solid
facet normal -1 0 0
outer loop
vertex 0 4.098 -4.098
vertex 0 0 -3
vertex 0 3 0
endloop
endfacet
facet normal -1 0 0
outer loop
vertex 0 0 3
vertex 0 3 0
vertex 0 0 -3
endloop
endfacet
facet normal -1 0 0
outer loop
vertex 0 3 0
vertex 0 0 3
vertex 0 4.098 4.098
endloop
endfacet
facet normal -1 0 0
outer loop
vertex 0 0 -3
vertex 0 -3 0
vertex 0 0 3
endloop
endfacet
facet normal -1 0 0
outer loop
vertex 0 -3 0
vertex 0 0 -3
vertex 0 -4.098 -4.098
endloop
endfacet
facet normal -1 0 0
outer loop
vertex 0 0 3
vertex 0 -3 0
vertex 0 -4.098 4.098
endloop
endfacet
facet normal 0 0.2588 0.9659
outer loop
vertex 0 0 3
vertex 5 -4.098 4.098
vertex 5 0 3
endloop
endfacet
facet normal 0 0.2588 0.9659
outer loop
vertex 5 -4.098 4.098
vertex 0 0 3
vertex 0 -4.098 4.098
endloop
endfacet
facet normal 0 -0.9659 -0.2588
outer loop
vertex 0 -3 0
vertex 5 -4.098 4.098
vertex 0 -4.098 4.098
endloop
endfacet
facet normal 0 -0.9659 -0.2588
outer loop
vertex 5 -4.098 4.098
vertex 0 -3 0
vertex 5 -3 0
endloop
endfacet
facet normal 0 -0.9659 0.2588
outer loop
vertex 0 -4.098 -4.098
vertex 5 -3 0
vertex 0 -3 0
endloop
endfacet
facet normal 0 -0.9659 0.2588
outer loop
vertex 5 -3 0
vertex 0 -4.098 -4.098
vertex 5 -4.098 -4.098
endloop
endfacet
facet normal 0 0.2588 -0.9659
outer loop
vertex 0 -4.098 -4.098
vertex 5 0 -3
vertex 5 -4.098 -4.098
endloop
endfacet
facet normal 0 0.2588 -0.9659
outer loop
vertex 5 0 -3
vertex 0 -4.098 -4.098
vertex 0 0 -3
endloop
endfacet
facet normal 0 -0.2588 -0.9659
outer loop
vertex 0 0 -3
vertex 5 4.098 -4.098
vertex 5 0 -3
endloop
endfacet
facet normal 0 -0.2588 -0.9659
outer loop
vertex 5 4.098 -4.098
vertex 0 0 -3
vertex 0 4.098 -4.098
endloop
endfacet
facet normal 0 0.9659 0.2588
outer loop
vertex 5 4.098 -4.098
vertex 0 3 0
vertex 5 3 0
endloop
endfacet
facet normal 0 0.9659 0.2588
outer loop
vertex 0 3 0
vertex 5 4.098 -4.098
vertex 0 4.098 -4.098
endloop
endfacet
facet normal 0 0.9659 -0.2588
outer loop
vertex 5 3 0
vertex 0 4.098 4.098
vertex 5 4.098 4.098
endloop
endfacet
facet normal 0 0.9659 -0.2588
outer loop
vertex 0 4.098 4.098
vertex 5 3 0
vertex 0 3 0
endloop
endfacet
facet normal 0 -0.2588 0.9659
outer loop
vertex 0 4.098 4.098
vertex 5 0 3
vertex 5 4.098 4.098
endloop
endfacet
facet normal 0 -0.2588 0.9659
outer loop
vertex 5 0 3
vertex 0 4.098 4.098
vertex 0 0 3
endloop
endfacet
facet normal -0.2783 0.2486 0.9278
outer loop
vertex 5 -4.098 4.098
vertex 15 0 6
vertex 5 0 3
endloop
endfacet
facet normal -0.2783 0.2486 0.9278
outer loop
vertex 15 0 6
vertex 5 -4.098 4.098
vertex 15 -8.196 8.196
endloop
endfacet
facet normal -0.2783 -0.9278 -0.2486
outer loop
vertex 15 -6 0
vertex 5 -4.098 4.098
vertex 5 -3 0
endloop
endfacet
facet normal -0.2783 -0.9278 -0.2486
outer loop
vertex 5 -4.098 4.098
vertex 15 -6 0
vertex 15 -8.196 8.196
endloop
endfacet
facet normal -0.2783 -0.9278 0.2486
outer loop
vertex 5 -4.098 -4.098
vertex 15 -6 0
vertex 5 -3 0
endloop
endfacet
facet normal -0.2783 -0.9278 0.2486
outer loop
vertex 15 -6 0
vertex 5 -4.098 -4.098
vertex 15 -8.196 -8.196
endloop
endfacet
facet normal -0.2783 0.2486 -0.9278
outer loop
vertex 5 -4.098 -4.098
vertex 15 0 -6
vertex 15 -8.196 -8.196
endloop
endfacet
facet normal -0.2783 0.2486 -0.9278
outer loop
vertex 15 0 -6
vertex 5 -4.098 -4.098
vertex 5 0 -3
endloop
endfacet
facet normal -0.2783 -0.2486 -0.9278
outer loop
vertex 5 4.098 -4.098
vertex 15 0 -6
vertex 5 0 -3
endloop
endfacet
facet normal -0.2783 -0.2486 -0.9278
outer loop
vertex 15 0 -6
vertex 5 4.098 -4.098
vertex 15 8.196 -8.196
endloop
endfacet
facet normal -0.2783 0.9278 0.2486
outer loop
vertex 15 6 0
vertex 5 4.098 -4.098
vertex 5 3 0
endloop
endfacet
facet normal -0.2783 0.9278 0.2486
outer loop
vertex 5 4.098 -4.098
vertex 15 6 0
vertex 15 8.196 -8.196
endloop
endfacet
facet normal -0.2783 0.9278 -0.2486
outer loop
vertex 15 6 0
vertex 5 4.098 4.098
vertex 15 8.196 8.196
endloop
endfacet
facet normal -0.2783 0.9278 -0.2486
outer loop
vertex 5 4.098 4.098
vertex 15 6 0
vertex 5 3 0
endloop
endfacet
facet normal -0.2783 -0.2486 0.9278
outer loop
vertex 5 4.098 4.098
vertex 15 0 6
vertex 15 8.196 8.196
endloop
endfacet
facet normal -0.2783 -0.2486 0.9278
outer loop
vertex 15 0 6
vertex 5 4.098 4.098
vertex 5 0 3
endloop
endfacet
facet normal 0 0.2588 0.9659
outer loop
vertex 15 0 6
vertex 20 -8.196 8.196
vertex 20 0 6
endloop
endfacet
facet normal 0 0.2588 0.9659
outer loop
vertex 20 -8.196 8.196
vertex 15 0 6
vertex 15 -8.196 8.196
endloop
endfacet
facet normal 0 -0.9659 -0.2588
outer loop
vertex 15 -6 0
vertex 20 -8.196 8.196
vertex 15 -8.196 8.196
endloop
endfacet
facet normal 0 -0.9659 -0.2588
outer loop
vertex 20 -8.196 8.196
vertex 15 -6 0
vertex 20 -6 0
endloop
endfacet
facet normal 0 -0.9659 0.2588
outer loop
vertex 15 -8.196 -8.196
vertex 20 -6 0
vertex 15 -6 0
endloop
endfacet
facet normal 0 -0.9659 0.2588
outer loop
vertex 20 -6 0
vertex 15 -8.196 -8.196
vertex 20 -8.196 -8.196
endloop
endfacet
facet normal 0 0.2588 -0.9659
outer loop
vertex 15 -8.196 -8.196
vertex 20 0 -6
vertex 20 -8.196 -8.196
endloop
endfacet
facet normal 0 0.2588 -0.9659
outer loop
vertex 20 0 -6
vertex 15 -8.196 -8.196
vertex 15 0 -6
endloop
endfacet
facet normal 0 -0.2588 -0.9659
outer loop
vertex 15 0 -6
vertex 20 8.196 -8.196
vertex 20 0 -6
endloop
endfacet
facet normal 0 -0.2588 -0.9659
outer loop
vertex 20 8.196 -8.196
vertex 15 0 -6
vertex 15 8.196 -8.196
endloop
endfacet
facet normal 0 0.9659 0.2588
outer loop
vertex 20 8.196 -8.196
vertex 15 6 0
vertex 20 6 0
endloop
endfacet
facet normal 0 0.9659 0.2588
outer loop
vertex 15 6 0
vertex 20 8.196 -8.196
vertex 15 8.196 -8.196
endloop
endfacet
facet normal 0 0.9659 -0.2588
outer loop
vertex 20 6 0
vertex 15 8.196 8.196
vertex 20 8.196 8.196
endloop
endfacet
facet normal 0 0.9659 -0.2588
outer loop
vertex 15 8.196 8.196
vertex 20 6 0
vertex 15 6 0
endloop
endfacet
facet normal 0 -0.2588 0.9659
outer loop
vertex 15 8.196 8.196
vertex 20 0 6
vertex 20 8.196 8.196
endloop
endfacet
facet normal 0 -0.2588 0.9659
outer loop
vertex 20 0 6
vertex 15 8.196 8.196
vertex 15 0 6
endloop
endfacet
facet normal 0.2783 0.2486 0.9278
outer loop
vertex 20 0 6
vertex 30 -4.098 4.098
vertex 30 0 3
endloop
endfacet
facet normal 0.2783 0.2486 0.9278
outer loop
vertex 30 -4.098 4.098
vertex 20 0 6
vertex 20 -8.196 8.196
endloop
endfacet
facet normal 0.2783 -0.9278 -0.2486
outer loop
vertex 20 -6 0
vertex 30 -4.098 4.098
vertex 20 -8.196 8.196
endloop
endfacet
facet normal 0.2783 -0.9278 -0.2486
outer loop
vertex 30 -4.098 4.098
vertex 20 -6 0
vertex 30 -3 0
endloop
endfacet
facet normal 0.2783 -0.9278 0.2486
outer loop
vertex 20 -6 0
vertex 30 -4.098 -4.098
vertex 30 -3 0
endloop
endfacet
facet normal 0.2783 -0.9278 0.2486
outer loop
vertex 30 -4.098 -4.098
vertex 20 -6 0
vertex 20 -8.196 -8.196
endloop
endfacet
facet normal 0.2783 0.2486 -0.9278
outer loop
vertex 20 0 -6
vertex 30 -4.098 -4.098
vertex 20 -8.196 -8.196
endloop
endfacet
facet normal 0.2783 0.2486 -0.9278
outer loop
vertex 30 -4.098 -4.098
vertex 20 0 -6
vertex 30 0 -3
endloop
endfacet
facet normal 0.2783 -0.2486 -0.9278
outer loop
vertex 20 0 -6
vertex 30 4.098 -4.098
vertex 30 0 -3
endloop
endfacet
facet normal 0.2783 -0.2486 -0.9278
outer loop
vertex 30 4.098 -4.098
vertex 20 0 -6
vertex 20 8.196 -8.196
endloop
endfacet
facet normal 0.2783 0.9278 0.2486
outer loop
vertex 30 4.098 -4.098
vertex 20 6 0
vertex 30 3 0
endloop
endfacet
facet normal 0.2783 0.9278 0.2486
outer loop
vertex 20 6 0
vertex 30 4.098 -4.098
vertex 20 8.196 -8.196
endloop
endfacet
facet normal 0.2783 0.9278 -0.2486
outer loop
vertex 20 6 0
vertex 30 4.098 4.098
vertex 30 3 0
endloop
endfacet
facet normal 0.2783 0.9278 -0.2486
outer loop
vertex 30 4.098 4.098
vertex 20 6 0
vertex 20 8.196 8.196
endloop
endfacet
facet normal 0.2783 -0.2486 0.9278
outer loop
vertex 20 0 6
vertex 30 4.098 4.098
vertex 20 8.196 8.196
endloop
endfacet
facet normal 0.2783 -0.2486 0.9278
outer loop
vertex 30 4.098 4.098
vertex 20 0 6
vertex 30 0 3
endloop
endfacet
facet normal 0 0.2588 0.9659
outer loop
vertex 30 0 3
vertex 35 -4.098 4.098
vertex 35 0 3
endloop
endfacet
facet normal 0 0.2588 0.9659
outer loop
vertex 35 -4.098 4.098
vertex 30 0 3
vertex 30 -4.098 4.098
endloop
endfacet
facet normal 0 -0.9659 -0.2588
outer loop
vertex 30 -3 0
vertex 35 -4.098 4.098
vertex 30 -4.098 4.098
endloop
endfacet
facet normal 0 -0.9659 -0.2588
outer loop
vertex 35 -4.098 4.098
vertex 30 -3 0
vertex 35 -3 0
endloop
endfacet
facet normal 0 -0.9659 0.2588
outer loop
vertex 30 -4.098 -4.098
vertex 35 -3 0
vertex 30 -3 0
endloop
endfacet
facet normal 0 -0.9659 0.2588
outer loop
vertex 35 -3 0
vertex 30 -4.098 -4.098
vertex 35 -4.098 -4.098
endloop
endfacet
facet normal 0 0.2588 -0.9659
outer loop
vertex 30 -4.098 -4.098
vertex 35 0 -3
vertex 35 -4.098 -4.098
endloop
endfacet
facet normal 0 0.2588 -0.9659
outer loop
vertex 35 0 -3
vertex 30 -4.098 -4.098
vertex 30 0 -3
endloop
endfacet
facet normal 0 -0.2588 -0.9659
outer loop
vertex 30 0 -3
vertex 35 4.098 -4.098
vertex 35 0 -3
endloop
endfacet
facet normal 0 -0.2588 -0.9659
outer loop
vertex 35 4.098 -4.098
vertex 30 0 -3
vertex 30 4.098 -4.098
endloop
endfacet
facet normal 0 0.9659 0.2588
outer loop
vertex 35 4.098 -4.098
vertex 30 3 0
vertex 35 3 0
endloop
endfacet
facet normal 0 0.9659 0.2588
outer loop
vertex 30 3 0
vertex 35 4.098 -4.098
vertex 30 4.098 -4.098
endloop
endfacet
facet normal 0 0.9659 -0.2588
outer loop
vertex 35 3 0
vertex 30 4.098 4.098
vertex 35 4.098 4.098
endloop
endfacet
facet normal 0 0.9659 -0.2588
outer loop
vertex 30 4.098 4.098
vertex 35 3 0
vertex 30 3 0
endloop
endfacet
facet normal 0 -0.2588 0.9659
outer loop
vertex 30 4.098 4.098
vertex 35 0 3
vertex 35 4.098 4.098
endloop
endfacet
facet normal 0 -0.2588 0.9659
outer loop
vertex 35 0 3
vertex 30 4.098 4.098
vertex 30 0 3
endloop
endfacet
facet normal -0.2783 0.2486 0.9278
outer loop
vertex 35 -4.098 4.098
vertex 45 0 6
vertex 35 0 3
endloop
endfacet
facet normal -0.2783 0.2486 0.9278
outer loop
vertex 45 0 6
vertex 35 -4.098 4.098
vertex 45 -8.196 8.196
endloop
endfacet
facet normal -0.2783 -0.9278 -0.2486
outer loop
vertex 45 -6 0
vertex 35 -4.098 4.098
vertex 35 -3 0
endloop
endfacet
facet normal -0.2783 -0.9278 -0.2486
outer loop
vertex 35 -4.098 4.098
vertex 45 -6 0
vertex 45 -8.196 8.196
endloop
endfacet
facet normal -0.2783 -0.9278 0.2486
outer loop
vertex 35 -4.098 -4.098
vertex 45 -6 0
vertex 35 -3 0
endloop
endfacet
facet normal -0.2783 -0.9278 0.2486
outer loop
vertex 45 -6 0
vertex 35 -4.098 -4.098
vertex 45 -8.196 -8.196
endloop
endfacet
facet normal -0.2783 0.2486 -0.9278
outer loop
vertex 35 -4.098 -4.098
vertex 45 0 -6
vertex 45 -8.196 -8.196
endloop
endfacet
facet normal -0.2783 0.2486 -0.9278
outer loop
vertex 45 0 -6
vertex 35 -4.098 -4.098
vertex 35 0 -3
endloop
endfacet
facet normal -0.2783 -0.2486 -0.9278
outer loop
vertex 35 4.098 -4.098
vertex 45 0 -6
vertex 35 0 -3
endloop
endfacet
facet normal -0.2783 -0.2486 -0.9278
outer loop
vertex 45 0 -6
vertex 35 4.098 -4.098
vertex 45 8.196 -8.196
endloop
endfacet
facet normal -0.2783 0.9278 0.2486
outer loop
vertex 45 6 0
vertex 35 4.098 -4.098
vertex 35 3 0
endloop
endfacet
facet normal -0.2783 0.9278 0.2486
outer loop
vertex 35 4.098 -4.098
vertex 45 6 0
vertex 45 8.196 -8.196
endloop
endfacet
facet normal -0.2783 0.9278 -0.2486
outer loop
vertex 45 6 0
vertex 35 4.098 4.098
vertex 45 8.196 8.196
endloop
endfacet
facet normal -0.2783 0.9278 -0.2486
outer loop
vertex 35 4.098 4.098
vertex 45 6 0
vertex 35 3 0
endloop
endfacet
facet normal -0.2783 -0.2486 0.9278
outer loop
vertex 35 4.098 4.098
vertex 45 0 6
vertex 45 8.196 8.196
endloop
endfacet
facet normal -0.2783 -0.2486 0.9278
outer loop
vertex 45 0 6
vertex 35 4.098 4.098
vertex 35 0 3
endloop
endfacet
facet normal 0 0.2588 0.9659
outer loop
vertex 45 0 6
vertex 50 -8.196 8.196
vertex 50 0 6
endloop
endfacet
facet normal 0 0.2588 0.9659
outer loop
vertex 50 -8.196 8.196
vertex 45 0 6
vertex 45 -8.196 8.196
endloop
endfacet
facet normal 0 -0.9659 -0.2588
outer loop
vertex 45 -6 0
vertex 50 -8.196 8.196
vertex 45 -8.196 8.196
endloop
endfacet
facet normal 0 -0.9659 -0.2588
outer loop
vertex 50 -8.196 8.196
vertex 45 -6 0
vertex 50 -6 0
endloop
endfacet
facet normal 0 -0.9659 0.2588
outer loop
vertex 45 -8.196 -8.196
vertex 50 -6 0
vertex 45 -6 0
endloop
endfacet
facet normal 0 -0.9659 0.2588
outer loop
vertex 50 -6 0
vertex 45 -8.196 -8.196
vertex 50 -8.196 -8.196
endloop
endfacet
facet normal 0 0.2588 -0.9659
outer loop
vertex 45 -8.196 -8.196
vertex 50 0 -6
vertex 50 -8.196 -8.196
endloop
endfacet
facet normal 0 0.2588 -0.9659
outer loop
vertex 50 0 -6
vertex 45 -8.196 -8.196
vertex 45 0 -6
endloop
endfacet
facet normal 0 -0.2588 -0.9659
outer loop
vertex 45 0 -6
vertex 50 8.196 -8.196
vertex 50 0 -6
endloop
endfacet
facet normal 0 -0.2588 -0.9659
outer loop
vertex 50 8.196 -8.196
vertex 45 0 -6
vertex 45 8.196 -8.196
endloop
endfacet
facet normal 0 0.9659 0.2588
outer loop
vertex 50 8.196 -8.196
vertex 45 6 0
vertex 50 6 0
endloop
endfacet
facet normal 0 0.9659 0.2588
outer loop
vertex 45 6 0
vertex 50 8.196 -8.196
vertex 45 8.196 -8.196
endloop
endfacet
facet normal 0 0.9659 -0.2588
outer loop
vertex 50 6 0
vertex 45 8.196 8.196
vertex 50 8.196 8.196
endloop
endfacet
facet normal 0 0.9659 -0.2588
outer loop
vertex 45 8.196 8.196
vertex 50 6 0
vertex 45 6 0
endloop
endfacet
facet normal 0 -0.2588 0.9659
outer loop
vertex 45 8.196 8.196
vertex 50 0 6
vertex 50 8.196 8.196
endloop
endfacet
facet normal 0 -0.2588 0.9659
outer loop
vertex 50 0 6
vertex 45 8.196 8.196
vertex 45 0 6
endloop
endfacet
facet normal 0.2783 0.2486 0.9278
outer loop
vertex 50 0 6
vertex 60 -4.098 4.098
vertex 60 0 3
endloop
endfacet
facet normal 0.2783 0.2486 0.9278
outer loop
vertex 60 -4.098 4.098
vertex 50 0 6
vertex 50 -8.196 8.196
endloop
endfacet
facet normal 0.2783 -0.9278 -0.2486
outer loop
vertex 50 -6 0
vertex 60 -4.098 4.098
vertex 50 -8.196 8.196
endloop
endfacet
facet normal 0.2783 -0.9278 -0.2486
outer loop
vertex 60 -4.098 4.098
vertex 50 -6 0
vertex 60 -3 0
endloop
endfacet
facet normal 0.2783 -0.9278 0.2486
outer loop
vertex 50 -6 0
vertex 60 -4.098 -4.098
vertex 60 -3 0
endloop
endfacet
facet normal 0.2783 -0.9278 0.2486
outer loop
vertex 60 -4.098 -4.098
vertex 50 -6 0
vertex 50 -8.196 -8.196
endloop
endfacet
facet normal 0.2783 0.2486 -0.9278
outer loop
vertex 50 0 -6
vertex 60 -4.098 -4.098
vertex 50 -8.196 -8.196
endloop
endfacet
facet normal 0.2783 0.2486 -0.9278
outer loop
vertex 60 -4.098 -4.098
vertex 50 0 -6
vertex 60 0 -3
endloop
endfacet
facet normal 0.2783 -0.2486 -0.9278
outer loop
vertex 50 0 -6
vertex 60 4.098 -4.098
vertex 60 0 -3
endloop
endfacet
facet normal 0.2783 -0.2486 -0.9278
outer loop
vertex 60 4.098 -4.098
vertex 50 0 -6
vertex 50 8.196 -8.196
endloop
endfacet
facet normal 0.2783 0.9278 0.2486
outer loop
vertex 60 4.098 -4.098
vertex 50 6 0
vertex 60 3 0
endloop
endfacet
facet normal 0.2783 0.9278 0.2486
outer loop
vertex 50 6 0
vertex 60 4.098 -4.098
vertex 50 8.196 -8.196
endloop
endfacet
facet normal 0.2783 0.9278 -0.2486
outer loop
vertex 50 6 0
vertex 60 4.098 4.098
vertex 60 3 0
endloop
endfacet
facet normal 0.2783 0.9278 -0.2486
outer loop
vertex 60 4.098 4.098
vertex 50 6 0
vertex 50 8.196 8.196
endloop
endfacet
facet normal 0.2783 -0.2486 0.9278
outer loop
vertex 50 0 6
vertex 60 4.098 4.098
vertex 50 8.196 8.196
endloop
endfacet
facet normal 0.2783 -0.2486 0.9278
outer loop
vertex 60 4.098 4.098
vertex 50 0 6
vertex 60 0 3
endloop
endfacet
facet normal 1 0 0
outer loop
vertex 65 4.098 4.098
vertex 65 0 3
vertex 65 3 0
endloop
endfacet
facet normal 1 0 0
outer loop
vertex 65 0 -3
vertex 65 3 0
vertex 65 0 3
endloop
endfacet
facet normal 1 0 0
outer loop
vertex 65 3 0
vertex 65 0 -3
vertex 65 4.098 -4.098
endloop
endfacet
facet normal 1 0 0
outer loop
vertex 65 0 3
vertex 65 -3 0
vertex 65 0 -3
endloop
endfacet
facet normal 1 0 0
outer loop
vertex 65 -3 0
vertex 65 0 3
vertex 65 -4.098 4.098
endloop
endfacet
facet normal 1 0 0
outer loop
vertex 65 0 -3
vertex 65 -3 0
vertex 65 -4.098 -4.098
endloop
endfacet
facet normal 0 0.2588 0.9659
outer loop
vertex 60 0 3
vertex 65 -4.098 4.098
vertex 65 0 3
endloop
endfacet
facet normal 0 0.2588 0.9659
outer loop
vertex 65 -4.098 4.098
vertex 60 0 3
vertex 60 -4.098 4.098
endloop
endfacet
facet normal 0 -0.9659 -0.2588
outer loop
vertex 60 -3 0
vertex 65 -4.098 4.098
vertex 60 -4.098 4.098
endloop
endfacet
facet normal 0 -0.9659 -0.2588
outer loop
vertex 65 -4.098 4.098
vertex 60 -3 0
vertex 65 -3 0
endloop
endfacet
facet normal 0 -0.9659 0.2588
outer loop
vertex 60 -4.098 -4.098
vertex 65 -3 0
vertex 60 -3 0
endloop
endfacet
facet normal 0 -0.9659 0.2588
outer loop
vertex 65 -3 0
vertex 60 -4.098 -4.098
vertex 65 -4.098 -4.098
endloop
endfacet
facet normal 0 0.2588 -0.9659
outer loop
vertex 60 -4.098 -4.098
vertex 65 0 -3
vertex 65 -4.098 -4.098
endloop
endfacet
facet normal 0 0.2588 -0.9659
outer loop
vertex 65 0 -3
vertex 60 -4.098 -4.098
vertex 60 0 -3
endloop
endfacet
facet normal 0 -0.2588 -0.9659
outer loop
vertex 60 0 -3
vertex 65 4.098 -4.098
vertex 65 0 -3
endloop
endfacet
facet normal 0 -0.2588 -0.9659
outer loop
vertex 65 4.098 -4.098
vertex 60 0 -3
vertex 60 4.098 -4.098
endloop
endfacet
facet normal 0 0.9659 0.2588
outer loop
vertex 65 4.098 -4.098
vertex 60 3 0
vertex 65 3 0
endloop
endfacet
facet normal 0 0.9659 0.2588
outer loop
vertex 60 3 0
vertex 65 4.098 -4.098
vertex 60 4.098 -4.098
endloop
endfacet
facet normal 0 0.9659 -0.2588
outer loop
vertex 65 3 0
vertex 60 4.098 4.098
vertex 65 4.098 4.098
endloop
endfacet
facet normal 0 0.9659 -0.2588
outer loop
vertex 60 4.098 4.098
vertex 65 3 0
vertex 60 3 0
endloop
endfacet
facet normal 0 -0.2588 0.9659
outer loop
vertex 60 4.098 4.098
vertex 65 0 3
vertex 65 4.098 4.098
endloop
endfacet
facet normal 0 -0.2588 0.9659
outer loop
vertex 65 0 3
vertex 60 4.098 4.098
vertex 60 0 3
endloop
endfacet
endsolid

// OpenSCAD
//-*- C -*-
// points = number of points (minimum 3)
// outer = radius to outer points
// inner = radius to inner points
module Star(points, outer, inner) {
	// polar to cartesian: radius/angle to x/y
	function x(r, a) = r * cos(a);
	function y(r, a) = r * sin(a);
	// angular width of each pie slice of the star
	increment = 360/points;
	union() {
		for (p = [0 : points-1]) {
			// outer is outer point p
			// inner is inner point following p
			// next is next outer point following p
			x_outer = x(outer, increment * p);
			y_outer = y(outer, increment * p);
			x_inner = x(inner, (increment * p) + (increment/2));
			y_inner = y(inner, (increment * p) + (increment/2));
			x_next = x(outer, increment * (p+1));
			y_next = y(outer, increment * (p+1));

			polygon(points = [[x_outer, y_outer],
			                  [x_inner, y_inner],
			                  [x_next, y_next],
			                  [0, 0]],
			         paths = [[0, 1, 2, 3]]);
		}
	}
}

module linxtrude(xx, hheight, sscale) {
	translate([xx,0,0]) rotate([0,90,0])
		linear_extrude(height = hheight, center=false, convexity=10,
		               twist=0, slices=1, scale = sscale)
			children();
}

cornAng = 60;
nCorn = 4;
contractRatio = 2;
contractRatioB = 2;
Rpore = 6;
Rtrot = Rpore/contractRatio;
RtrotB = Rpore/contractRatioB;

ROFactor=(1.+1./tan(cornAng/2.))/sqrt(2.);

linxtrude( 0,  5.000000000001, 1.)           Star(nCorn, RtrotB, ROFactor*RtrotB);
linxtrude( 5, 10.000000000001, Rpore/RtrotB) Star(nCorn, RtrotB, ROFactor*RtrotB);
linxtrude(15,  5.000000000001, 1)            Star(nCorn, Rpore,  ROFactor*Rpore);
linxtrude(20, 10.000000000001, Rtrot/Rpore)  Star(nCorn, Rpore,  ROFactor*Rpore);
linxtrude(30,  5.000000000001, 1)            Star(nCorn, Rtrot,  ROFactor*Rtrot);
linxtrude(35, 10.000000000001, Rpore/Rtrot)  Star(nCorn, Rtrot,  ROFactor*Rtrot);
linxtrude(45,  5.000000000001, 1)            Star(nCorn, Rpore,  ROFactor*Rpore);
linxtrude(50, 10.000000000001, RtrotB/Rpore) Star(nCorn, Rpore,  ROFactor*Rpore);
linxtrude(60,  5.000000000000, 1)            Star(nCorn, RtrotB, ROFactor*RtrotB);
